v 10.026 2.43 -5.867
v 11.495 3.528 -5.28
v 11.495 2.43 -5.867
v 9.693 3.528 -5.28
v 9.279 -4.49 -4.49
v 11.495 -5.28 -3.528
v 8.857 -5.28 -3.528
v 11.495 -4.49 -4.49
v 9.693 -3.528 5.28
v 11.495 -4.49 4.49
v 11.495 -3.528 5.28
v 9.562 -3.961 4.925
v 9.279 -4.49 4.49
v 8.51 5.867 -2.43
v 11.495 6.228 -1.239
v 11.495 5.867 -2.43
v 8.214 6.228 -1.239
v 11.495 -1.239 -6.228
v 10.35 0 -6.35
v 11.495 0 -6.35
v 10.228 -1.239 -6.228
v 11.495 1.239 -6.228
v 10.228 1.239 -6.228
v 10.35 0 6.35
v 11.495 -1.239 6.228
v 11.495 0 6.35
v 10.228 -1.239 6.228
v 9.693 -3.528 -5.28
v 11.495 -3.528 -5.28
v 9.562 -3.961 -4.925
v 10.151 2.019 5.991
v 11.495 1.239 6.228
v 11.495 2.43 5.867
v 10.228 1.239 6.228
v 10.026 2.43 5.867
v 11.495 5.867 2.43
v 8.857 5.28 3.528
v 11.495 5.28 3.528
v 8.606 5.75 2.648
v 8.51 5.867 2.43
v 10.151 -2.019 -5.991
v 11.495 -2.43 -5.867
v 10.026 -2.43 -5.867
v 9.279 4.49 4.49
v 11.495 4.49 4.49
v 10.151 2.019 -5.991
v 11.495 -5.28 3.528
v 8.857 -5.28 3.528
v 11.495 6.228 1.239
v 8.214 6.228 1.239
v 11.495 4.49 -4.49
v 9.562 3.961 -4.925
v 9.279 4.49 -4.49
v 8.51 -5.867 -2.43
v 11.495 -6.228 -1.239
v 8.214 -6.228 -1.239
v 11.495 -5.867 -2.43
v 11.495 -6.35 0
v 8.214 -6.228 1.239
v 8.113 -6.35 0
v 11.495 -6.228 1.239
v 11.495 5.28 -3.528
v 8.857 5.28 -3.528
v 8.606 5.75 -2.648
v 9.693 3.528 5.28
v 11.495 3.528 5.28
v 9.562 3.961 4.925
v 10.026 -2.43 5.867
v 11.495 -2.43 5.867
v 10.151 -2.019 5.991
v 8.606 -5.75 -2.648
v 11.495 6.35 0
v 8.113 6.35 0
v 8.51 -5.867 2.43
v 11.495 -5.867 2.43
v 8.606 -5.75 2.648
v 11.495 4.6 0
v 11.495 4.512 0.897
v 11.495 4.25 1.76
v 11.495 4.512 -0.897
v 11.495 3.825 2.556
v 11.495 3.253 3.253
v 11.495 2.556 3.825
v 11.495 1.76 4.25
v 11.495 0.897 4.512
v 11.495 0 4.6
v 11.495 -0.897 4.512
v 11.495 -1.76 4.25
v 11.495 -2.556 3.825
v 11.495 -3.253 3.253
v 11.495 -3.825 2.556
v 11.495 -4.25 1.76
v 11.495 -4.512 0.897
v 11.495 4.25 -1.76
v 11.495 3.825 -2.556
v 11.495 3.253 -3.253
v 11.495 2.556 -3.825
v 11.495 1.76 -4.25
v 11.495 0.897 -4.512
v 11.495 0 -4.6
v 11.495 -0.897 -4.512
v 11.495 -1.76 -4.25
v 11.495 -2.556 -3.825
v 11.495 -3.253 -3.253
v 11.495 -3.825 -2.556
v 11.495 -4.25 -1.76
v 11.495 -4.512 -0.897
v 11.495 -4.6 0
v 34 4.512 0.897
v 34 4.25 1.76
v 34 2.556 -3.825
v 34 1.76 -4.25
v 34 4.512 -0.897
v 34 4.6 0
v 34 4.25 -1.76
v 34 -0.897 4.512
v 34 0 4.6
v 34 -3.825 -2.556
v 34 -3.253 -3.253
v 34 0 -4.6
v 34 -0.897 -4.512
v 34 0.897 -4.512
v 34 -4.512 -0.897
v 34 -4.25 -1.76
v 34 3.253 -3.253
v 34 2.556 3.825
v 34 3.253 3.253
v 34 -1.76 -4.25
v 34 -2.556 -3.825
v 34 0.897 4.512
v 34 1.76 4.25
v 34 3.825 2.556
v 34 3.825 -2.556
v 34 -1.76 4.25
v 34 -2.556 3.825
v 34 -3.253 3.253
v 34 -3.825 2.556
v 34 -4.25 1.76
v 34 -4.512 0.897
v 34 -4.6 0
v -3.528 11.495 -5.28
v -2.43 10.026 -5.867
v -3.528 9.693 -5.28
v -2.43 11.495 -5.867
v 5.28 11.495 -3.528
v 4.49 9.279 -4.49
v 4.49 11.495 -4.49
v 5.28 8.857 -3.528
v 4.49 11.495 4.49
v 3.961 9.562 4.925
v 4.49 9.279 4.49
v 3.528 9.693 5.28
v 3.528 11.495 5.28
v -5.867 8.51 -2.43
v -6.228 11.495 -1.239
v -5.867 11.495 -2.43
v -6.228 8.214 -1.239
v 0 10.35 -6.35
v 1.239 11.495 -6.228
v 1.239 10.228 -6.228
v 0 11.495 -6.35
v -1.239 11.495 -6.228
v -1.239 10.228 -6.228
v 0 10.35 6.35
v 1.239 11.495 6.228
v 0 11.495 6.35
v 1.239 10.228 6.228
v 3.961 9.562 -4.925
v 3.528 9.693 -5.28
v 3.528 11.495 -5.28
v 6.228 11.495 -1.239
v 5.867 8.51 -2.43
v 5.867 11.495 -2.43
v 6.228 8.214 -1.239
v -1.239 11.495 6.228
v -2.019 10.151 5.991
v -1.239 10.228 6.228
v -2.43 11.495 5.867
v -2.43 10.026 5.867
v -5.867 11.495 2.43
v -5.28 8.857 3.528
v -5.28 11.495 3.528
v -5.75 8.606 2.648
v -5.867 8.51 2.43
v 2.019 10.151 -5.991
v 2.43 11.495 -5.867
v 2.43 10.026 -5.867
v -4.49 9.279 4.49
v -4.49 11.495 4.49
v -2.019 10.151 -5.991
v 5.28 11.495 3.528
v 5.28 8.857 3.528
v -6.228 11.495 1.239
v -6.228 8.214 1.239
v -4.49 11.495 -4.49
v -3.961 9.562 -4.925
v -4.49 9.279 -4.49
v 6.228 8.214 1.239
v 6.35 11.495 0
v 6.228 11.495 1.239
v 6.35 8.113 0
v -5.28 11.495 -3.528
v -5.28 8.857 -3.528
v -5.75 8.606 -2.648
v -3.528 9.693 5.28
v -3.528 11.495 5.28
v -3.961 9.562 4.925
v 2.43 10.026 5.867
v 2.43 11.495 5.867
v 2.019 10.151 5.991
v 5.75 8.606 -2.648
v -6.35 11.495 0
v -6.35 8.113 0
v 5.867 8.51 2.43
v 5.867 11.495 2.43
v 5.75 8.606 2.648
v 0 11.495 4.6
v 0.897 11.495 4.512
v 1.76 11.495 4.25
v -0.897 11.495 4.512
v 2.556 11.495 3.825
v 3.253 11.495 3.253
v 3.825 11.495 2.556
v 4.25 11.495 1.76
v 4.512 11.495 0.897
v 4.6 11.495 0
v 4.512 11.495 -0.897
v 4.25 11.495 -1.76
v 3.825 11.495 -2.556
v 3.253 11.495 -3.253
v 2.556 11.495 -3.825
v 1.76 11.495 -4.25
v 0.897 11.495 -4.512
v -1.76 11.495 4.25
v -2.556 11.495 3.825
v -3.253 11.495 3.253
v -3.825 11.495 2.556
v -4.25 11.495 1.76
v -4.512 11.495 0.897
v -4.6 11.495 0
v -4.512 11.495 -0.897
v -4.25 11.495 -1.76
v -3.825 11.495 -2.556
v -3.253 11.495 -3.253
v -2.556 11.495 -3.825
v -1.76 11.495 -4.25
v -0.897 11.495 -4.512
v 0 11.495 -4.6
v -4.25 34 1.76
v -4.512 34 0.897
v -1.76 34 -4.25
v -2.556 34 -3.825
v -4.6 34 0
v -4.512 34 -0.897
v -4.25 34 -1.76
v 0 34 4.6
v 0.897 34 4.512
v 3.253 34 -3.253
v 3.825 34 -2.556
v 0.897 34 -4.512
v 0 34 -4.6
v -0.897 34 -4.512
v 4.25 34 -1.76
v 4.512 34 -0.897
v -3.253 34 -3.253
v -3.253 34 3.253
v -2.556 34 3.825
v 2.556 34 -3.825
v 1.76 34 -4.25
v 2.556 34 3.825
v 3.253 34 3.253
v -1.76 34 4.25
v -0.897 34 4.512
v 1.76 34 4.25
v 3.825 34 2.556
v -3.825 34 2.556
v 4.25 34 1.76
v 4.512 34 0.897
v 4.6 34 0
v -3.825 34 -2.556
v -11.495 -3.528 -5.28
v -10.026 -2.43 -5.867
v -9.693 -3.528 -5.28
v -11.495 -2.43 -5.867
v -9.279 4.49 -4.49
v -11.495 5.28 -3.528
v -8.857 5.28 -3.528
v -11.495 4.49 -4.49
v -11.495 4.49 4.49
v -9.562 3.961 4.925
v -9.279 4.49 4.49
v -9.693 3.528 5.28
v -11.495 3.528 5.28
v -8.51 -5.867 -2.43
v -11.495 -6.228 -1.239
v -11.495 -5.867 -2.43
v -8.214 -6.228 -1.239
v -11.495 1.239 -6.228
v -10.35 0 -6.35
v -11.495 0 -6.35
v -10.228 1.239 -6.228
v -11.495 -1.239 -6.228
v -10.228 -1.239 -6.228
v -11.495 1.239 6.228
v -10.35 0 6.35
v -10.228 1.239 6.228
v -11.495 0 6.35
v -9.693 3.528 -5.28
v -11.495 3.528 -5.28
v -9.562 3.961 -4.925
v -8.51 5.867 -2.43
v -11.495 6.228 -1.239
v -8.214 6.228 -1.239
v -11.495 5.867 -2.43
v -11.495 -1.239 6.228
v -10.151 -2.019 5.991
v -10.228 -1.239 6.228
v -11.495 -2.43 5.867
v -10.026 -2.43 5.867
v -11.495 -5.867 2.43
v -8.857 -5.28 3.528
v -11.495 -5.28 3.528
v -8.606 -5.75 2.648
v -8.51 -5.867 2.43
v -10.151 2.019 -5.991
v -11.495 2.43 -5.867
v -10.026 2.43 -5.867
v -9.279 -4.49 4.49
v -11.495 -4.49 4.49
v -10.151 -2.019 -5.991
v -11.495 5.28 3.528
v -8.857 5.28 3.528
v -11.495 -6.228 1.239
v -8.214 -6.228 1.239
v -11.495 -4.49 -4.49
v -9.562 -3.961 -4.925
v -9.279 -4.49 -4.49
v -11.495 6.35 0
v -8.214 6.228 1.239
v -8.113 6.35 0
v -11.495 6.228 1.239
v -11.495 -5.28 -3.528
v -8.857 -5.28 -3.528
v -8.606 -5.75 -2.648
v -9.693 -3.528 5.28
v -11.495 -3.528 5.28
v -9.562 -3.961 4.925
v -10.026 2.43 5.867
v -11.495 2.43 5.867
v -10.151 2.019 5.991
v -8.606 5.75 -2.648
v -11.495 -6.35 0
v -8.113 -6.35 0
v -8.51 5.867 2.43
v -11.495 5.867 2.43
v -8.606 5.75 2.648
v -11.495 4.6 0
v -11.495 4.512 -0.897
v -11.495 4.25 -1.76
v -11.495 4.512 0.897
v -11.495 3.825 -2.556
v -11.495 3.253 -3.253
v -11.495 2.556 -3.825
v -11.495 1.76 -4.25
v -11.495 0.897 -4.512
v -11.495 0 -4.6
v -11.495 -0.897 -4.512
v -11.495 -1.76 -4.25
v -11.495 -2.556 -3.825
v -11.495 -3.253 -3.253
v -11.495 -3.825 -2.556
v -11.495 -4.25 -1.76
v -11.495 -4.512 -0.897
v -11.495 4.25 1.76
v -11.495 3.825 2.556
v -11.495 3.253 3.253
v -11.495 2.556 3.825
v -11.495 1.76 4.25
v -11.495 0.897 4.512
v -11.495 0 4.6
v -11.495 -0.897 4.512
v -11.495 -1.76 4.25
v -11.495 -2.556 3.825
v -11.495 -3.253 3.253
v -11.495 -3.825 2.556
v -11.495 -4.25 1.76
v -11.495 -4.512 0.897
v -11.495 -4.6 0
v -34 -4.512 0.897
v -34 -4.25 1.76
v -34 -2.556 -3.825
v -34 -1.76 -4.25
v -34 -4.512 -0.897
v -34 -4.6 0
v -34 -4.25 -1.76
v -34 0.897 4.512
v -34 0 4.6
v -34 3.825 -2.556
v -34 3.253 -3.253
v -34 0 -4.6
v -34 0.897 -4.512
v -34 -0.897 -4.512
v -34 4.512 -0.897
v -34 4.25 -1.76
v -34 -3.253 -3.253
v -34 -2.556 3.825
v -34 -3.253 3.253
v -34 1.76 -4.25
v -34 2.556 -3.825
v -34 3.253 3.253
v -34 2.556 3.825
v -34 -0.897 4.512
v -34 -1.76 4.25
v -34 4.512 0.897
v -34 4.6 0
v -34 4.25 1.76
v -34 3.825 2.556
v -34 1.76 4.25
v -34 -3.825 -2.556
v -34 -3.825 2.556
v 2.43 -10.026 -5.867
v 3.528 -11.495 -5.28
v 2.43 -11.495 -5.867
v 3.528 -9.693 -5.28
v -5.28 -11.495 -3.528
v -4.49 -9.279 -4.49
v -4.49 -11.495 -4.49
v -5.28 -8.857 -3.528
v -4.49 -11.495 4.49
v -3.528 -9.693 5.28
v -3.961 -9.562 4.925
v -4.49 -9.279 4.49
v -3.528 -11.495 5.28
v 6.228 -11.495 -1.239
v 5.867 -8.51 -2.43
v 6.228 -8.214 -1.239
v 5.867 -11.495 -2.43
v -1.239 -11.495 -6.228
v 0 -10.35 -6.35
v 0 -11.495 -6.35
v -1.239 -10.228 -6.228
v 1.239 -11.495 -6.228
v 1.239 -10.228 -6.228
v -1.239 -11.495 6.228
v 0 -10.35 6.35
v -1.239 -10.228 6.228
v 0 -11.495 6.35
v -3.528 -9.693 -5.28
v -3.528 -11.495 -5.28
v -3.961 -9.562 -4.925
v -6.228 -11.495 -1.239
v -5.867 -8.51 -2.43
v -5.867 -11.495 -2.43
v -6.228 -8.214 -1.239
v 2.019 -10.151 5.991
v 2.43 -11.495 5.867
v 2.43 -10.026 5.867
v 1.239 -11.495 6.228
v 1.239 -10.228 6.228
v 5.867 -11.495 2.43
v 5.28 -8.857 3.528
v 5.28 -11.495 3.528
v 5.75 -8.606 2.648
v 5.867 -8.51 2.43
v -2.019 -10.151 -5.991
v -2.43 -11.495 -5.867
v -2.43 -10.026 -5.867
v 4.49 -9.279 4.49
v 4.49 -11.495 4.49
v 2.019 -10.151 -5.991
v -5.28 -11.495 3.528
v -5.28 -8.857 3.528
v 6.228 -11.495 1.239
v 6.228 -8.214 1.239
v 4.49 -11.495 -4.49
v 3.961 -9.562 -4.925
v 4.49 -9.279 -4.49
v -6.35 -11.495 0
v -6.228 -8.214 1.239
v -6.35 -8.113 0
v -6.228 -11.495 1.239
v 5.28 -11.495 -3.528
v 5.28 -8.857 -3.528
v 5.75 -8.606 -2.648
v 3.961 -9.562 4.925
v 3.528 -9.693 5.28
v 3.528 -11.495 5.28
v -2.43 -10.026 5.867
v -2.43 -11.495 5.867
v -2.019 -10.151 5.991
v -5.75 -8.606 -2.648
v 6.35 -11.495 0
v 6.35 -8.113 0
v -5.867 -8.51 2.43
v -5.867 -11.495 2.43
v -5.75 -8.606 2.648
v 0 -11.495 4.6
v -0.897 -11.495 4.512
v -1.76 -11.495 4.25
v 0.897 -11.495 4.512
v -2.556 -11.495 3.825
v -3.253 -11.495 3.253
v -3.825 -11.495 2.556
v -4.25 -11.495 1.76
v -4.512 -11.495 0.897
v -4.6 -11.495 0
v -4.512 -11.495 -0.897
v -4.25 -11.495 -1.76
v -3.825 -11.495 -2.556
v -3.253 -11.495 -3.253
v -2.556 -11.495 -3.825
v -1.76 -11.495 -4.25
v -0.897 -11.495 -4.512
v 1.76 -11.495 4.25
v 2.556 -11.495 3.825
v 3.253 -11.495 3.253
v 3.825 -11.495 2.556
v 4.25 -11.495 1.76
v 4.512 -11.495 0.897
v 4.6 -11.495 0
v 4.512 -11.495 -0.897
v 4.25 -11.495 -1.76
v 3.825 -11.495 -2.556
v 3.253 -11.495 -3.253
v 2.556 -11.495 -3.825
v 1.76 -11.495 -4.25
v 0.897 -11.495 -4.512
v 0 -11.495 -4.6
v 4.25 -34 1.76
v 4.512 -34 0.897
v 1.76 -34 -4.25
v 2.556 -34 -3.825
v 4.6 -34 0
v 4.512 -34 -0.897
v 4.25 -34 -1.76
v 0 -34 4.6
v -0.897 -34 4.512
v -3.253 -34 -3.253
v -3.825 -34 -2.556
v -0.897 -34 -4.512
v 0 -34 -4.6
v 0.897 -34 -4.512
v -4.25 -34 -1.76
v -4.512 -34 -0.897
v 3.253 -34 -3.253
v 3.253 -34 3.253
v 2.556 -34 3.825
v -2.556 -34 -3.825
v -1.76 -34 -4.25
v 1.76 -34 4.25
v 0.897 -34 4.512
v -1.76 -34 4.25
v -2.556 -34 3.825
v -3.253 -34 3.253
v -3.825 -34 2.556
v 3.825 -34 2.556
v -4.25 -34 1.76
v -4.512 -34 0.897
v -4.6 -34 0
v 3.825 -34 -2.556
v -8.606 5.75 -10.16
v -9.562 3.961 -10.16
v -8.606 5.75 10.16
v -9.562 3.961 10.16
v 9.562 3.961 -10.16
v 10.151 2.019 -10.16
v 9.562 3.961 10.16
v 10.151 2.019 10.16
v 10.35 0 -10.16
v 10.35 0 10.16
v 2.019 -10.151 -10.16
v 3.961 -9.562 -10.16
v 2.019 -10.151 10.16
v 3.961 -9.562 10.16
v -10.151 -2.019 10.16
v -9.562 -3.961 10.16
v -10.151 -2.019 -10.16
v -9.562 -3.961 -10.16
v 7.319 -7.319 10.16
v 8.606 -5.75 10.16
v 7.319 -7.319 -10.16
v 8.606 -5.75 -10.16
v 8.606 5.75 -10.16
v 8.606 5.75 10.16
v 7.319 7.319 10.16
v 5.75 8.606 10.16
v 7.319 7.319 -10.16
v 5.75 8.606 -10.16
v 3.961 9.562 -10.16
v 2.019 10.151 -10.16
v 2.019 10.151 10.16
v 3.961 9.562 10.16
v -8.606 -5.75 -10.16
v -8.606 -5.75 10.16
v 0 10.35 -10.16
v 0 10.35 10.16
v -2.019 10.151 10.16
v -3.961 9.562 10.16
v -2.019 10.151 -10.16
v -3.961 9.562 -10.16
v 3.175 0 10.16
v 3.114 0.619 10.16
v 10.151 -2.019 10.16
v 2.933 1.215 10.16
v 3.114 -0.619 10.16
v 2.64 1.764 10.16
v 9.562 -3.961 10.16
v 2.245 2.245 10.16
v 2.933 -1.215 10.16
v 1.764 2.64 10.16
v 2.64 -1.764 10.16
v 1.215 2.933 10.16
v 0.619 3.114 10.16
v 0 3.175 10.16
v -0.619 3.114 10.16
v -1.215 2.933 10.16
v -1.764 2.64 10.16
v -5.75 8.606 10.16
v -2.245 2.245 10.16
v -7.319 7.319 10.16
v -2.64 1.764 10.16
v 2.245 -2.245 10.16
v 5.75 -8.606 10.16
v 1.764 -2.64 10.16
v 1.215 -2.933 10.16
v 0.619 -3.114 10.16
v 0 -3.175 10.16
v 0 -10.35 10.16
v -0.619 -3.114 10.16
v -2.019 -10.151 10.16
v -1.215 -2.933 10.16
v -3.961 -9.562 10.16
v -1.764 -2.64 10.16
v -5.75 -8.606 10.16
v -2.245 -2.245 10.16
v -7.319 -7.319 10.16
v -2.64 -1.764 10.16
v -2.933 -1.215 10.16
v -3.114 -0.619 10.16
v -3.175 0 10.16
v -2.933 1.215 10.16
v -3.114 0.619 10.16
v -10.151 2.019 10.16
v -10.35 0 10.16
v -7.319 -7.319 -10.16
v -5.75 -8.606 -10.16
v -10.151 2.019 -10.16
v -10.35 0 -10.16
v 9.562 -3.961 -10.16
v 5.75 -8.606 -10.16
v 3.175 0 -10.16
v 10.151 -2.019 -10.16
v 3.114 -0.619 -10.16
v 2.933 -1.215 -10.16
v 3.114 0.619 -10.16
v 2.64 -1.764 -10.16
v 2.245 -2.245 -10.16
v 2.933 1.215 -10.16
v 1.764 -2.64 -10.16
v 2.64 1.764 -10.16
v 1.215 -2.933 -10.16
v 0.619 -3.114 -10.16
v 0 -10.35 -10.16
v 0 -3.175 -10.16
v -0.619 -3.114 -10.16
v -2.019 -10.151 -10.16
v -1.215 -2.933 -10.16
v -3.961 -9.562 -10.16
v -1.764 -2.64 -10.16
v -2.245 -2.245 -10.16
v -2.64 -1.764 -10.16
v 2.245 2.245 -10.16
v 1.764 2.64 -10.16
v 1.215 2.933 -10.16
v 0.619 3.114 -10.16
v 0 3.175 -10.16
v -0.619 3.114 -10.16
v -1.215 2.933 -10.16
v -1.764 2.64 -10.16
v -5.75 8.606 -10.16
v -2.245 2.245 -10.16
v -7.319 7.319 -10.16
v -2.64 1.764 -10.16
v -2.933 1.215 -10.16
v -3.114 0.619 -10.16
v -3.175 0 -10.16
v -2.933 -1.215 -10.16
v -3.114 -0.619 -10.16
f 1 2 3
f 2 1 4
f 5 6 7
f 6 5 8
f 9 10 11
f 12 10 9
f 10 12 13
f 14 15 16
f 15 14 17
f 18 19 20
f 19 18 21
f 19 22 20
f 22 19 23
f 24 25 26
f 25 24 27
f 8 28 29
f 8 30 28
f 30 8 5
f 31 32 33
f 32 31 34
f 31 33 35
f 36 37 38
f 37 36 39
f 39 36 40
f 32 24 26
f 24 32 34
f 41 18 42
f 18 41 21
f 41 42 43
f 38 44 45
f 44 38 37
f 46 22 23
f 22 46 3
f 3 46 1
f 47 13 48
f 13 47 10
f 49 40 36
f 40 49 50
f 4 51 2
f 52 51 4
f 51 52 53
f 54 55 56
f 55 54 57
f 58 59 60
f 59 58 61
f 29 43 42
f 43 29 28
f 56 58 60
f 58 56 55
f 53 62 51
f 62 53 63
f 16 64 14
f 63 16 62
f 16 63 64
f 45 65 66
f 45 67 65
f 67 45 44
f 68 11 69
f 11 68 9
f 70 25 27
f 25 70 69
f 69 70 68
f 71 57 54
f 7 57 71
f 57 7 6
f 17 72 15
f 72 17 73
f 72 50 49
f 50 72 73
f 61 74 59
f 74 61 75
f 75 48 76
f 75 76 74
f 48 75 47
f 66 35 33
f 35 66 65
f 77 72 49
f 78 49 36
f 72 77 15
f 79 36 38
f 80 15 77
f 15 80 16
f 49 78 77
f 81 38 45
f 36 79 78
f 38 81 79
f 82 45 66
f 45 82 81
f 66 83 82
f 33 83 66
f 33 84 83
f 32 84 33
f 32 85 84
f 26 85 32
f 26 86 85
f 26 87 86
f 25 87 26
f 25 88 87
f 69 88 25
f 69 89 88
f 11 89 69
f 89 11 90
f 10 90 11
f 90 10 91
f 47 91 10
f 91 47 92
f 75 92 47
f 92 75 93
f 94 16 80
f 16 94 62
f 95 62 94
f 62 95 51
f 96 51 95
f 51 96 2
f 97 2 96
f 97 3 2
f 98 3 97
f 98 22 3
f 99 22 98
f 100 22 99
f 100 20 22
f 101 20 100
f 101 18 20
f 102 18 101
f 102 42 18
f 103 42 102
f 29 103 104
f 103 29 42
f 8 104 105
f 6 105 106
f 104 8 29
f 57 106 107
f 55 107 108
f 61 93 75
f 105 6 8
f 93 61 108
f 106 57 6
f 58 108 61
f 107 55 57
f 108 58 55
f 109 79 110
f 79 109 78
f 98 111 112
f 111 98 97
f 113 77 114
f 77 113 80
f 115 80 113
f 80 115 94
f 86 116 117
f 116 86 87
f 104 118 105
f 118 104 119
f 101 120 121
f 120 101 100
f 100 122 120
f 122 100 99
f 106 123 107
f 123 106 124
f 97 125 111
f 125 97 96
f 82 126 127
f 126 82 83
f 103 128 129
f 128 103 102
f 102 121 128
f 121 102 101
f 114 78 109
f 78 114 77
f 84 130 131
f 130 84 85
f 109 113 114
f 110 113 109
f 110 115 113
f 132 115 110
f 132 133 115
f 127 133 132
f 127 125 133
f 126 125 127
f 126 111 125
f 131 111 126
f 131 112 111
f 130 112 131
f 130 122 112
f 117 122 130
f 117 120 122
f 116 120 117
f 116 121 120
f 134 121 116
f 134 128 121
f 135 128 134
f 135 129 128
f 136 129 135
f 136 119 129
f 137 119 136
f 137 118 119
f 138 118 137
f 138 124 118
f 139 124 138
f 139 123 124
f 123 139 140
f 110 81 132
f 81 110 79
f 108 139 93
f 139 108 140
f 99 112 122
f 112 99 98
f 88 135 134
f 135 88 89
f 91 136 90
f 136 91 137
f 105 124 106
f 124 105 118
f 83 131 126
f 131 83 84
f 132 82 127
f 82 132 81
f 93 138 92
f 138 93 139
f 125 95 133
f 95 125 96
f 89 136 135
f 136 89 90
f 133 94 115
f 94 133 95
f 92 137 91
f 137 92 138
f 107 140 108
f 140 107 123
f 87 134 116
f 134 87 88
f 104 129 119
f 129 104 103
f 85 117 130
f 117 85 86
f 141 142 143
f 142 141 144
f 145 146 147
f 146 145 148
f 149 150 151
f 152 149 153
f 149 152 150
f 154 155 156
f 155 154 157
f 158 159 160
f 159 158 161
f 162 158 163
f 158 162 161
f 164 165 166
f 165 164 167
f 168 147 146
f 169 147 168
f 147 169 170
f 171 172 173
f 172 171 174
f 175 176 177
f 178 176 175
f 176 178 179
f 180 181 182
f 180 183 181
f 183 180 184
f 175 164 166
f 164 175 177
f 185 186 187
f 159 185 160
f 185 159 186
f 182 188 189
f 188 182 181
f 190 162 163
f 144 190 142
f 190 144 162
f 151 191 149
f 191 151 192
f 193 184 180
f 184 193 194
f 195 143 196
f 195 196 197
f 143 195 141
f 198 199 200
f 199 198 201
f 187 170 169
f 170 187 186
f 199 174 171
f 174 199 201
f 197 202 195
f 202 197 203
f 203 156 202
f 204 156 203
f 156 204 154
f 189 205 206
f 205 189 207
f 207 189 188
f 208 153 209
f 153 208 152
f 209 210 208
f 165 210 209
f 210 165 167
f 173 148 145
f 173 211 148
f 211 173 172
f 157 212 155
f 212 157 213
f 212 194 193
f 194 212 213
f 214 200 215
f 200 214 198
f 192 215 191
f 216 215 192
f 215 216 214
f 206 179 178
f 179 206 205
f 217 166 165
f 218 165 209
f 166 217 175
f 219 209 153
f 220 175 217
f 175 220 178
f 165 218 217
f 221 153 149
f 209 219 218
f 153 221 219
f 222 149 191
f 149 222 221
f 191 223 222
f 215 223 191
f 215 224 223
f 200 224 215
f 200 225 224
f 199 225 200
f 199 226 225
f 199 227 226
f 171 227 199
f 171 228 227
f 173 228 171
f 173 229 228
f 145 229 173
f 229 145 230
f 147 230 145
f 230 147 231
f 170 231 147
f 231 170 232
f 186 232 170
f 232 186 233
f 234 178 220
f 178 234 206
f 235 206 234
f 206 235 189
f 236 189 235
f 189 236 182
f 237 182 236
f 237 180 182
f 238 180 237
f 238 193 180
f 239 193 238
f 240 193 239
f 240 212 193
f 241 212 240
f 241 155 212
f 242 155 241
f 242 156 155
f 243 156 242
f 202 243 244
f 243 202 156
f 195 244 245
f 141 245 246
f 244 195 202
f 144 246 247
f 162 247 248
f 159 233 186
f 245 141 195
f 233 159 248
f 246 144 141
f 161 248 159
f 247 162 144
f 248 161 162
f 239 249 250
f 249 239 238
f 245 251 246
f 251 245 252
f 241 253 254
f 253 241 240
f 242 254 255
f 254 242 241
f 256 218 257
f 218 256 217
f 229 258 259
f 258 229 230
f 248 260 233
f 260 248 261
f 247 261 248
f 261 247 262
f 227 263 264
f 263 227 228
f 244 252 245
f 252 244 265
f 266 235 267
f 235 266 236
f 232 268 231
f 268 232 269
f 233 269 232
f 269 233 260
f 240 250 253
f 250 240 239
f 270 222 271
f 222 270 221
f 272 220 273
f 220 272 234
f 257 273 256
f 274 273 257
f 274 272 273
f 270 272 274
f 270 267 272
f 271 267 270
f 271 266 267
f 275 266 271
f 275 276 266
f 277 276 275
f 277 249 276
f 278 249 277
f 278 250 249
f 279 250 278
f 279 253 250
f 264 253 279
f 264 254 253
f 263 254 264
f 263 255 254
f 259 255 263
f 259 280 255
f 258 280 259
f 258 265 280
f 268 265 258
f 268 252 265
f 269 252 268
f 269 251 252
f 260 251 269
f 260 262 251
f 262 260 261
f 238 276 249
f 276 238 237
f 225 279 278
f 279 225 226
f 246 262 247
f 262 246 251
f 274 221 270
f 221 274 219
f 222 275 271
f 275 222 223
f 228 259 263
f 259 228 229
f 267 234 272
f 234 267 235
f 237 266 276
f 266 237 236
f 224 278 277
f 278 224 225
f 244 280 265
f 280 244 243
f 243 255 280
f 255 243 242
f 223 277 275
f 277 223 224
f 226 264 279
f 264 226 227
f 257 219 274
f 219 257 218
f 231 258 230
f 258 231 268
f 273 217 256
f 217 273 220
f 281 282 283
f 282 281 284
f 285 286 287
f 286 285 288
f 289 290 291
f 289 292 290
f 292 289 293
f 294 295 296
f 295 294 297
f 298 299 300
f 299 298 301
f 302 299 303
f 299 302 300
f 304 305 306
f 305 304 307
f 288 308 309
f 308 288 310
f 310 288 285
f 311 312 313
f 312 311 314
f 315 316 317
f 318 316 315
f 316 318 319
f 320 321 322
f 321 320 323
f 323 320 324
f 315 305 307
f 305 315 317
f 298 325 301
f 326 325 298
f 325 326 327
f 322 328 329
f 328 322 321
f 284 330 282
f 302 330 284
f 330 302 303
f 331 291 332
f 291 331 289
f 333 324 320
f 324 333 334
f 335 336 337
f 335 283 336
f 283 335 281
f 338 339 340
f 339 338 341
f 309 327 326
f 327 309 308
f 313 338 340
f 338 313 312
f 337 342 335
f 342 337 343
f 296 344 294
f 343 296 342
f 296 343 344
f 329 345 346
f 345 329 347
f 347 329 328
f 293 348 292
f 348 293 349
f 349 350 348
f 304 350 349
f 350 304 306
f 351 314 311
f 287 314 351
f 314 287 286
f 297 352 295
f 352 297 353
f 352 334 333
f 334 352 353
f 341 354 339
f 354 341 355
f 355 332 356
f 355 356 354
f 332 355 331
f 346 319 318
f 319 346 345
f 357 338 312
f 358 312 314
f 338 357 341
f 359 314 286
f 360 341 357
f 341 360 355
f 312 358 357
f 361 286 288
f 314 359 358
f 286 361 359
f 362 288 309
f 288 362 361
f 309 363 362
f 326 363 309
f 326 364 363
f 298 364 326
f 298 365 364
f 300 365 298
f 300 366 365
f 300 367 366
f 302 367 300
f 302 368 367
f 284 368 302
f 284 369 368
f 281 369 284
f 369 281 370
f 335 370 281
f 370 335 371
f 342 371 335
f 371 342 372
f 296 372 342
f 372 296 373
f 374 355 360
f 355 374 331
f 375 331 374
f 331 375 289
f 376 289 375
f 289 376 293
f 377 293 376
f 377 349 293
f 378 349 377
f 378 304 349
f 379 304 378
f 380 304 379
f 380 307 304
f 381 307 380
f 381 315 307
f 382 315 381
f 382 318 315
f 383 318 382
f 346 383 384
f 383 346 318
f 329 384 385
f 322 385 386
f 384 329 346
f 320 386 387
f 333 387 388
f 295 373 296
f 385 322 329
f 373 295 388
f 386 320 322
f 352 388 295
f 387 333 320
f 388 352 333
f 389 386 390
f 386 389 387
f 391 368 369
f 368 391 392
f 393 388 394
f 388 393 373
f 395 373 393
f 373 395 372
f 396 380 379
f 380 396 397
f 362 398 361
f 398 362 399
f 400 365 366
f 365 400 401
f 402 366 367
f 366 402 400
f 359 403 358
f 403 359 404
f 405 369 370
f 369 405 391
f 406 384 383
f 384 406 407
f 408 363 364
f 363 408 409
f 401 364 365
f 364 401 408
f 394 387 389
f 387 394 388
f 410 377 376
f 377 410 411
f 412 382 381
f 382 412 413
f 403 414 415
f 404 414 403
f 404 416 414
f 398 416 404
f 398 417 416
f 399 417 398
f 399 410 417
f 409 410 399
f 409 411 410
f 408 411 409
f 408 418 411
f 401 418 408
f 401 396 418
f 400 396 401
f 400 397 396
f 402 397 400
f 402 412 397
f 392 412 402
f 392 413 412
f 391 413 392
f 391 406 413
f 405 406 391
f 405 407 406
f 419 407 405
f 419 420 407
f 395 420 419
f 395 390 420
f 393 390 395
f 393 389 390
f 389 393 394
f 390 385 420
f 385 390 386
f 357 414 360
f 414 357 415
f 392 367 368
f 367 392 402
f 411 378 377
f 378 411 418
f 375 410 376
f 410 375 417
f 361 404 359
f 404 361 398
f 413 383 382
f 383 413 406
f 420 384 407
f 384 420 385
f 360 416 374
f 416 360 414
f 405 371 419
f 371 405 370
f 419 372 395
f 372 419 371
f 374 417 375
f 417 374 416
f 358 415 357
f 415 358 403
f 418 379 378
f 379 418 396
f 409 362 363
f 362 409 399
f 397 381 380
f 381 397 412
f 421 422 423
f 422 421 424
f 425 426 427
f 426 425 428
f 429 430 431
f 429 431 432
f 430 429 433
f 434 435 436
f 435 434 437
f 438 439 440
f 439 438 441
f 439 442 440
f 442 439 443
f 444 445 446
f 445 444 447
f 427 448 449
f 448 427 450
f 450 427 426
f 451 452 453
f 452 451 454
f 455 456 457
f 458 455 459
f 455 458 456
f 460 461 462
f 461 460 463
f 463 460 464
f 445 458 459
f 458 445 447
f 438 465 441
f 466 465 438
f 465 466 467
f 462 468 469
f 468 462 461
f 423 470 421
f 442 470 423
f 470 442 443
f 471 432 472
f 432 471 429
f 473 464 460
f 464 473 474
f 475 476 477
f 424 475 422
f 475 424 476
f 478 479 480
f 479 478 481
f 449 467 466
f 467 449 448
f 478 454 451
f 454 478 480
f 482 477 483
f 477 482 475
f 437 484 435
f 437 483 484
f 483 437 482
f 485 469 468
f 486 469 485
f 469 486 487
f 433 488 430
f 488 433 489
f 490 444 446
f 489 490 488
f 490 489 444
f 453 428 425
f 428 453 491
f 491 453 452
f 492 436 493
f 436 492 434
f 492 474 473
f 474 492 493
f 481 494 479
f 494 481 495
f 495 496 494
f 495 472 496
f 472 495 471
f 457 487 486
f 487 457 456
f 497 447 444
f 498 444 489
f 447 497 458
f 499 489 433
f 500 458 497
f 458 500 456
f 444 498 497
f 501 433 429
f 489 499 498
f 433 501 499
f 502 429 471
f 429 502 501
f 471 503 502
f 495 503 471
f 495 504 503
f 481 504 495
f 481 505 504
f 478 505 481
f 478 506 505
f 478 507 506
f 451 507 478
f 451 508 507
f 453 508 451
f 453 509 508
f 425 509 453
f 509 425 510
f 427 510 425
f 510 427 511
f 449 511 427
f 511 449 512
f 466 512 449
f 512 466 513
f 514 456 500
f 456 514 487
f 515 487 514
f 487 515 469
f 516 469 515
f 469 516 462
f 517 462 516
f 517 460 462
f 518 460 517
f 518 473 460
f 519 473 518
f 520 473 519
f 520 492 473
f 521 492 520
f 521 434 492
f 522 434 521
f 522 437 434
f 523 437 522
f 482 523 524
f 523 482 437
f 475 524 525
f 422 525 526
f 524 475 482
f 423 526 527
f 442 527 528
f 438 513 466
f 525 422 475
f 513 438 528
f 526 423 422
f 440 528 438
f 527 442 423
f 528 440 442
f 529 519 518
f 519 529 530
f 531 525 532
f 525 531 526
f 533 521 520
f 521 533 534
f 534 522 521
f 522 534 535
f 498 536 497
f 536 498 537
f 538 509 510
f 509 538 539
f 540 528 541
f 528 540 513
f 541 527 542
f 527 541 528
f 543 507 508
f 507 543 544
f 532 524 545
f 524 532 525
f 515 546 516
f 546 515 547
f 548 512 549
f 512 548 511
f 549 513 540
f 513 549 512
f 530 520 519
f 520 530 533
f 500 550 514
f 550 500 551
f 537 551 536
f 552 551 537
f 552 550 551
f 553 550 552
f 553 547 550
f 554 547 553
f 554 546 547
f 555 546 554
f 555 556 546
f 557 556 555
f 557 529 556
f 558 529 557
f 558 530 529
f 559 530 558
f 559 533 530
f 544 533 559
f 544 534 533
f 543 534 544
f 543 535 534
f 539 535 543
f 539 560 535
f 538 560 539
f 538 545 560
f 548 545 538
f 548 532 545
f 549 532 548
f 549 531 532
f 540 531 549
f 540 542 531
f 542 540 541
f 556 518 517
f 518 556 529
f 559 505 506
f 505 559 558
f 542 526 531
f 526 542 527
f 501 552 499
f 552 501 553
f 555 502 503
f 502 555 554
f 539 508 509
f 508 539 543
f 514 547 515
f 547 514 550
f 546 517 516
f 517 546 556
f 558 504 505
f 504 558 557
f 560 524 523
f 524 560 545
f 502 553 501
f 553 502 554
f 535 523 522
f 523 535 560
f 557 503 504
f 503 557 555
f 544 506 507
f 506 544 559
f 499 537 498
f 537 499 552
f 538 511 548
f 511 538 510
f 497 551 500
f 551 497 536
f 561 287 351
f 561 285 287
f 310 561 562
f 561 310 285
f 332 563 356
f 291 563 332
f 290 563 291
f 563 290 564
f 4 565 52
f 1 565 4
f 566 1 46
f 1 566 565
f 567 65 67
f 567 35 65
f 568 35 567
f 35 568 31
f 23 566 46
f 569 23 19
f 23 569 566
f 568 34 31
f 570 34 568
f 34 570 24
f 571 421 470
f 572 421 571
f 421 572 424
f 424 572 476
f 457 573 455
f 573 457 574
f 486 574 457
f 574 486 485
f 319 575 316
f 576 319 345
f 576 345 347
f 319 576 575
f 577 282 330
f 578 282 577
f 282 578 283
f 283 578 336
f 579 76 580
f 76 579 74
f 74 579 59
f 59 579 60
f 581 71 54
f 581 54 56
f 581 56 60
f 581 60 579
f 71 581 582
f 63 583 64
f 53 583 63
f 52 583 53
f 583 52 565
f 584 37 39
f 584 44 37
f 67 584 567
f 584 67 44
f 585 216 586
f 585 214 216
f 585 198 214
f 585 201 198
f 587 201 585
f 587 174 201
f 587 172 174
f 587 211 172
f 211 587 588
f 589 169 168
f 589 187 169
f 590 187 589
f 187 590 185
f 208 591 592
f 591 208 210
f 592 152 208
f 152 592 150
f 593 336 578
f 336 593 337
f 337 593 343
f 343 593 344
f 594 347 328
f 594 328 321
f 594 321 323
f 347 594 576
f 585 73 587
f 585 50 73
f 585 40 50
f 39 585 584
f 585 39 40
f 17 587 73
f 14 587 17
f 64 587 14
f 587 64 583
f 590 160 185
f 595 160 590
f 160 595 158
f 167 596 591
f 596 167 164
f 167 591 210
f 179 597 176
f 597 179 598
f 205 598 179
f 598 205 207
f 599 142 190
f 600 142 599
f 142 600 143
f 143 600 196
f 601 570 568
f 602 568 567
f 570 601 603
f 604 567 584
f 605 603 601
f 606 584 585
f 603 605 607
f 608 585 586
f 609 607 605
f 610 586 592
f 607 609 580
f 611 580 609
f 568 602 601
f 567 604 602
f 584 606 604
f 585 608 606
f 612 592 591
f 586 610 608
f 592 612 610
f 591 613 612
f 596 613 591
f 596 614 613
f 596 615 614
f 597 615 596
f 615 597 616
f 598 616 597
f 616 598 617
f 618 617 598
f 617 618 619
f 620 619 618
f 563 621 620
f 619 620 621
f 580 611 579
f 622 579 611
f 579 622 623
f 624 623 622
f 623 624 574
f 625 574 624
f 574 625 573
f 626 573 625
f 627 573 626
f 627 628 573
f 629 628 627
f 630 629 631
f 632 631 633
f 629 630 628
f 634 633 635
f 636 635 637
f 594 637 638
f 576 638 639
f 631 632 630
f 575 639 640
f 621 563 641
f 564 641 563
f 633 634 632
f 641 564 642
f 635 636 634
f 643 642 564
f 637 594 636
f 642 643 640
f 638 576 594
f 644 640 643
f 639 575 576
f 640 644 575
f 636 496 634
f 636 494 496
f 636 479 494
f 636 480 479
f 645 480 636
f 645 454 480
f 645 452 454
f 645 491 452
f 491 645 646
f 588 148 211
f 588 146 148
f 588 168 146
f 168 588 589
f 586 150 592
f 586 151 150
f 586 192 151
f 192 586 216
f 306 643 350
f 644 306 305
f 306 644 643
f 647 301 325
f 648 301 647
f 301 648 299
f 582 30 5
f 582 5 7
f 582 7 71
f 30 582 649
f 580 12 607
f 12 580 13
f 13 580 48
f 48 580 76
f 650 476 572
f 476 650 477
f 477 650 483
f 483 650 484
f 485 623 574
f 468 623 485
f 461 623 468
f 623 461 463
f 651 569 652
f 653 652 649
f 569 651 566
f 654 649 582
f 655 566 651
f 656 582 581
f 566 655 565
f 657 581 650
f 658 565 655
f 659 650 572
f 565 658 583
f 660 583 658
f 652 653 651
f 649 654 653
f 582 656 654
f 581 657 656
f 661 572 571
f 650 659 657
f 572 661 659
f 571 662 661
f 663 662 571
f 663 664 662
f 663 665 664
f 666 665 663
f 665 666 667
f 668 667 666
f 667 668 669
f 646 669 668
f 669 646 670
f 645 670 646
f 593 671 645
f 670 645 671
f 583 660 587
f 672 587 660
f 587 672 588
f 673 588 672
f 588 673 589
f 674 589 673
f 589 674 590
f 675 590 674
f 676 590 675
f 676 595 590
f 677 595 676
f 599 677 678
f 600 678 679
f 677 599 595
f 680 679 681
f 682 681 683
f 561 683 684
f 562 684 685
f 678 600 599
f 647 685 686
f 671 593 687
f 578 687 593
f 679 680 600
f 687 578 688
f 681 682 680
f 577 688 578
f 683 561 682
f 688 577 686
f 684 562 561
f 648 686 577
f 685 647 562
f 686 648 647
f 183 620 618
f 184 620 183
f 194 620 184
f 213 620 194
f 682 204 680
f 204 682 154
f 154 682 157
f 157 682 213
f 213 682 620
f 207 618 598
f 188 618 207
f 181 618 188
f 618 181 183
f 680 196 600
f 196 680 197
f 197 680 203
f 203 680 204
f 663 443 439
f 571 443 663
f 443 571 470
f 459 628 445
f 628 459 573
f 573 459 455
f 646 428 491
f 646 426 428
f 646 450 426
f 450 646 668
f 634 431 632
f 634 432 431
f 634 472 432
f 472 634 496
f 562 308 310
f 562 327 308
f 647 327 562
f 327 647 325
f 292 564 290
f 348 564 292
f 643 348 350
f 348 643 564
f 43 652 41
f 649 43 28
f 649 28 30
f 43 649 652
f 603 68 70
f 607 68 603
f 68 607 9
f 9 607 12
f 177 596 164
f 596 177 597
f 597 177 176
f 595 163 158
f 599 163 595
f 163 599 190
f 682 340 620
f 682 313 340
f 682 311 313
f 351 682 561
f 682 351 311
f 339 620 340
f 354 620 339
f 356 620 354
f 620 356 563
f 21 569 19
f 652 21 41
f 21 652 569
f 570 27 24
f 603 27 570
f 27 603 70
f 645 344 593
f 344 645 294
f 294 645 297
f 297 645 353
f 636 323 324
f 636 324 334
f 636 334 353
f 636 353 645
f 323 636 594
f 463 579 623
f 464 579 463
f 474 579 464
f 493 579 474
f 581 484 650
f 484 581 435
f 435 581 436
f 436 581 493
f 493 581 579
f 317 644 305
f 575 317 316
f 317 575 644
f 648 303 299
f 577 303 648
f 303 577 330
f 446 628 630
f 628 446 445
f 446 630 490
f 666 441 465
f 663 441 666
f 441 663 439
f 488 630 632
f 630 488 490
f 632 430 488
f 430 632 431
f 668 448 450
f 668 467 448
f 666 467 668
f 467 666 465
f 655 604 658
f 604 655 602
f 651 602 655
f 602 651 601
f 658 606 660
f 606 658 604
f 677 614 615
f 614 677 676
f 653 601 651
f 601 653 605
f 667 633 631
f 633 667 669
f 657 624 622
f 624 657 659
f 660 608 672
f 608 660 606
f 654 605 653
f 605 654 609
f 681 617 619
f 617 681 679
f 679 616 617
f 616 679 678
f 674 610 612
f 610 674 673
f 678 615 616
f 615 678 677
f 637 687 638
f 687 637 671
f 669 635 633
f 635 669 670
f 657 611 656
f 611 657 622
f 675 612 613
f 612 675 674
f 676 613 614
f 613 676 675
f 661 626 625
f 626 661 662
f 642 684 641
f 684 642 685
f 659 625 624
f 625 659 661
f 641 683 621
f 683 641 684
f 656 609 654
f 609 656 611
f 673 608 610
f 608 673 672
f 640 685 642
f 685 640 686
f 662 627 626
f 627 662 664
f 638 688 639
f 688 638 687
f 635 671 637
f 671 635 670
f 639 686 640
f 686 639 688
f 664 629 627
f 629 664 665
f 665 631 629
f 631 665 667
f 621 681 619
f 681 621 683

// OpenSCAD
$fn = 32;

// ----------------------------------------------------------------------
// Cardan cross: 68 mm span, 12.7 mm trunnions
// ----------------------------------------------------------------------

// --- parameters (mm) ---
journal_d = 12.7;         // trunnion diameter
arm_len = 34;             // trunnion length from the centre
step_r = 4.32;            // step position from the centre
step_d = 9.2;             // journal diameter after the step
hub_d = 20.7;             // hub diameter
hub_h = 20.32;            // hub height
bore_d = 6.35;            // hub bore

difference() {
  union() {
    /* hub along the joint axis */
    cylinder(h = hub_h, d = hub_d, center = true);
    for (a = [0 : 90 : 270]) rotate([0, 0, a]) {
      /* trunnion, sunk into the hub */
      translate([hub_d / 4, 0, 0]) rotate([0, 90, 0]) cylinder(h = step_r + 2, d = journal_d);
      /* stepped journal out to the tip */
      translate([step_r - 0.5, 0, 0]) rotate([0, 90, 0]) cylinder(h = arm_len + 0.5 - step_r, d = step_d);
    }
  }
  /* lubrication bore through the hub, 2.5 mm clear on both sides */
  translate([0, 0, -hub_h / 2 - 2.5]) cylinder(h = hub_h + 5, d = bore_d);
}
